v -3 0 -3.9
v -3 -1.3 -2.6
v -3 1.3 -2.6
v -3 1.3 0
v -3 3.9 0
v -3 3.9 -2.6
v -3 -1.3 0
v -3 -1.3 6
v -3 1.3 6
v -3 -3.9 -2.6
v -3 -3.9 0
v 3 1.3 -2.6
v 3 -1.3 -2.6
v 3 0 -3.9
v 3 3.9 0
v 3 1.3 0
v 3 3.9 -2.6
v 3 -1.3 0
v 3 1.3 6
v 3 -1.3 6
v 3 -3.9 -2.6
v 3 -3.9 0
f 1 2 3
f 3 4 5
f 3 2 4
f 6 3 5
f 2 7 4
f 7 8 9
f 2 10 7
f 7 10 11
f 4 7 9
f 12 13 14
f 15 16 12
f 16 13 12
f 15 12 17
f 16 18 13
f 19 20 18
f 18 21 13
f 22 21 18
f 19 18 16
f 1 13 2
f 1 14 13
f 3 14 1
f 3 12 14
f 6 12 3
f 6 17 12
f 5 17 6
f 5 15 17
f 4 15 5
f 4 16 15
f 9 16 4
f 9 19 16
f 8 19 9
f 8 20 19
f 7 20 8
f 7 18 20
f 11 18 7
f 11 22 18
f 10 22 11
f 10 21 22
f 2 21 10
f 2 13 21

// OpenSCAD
// -*- mode: SCAD ; c-file-style: "ellemtel" ; coding: utf-8 -*-
//
// NN
//
// © 2017 Roland Sieker <ospalh@gmail.com>
// Licence: CC-BY-SA 4.0


zmin = 6;

h = 6;
w=6;
gr = 2.6;

gh=gr/2;

module p()
{
   polygon(
      [
         [-h,-gh],
         [0,-gh],
         [0,-gh-gr],
         [gr,-gh-gr],
         [gr,-gh],

[gr+gh,0],

         [gr,gh],
         [gr,gh+gr],

         [0,gh+gr],
         [0,gh],
         [-h,gh],
         ]
      );
}

module pt()
{
   translate([-w/2,0,0])
   {
      rotate([0, 90, 0])
      {
         linear_extrude(w)
         {
            p();
         }
      }
   }
}

pt();
